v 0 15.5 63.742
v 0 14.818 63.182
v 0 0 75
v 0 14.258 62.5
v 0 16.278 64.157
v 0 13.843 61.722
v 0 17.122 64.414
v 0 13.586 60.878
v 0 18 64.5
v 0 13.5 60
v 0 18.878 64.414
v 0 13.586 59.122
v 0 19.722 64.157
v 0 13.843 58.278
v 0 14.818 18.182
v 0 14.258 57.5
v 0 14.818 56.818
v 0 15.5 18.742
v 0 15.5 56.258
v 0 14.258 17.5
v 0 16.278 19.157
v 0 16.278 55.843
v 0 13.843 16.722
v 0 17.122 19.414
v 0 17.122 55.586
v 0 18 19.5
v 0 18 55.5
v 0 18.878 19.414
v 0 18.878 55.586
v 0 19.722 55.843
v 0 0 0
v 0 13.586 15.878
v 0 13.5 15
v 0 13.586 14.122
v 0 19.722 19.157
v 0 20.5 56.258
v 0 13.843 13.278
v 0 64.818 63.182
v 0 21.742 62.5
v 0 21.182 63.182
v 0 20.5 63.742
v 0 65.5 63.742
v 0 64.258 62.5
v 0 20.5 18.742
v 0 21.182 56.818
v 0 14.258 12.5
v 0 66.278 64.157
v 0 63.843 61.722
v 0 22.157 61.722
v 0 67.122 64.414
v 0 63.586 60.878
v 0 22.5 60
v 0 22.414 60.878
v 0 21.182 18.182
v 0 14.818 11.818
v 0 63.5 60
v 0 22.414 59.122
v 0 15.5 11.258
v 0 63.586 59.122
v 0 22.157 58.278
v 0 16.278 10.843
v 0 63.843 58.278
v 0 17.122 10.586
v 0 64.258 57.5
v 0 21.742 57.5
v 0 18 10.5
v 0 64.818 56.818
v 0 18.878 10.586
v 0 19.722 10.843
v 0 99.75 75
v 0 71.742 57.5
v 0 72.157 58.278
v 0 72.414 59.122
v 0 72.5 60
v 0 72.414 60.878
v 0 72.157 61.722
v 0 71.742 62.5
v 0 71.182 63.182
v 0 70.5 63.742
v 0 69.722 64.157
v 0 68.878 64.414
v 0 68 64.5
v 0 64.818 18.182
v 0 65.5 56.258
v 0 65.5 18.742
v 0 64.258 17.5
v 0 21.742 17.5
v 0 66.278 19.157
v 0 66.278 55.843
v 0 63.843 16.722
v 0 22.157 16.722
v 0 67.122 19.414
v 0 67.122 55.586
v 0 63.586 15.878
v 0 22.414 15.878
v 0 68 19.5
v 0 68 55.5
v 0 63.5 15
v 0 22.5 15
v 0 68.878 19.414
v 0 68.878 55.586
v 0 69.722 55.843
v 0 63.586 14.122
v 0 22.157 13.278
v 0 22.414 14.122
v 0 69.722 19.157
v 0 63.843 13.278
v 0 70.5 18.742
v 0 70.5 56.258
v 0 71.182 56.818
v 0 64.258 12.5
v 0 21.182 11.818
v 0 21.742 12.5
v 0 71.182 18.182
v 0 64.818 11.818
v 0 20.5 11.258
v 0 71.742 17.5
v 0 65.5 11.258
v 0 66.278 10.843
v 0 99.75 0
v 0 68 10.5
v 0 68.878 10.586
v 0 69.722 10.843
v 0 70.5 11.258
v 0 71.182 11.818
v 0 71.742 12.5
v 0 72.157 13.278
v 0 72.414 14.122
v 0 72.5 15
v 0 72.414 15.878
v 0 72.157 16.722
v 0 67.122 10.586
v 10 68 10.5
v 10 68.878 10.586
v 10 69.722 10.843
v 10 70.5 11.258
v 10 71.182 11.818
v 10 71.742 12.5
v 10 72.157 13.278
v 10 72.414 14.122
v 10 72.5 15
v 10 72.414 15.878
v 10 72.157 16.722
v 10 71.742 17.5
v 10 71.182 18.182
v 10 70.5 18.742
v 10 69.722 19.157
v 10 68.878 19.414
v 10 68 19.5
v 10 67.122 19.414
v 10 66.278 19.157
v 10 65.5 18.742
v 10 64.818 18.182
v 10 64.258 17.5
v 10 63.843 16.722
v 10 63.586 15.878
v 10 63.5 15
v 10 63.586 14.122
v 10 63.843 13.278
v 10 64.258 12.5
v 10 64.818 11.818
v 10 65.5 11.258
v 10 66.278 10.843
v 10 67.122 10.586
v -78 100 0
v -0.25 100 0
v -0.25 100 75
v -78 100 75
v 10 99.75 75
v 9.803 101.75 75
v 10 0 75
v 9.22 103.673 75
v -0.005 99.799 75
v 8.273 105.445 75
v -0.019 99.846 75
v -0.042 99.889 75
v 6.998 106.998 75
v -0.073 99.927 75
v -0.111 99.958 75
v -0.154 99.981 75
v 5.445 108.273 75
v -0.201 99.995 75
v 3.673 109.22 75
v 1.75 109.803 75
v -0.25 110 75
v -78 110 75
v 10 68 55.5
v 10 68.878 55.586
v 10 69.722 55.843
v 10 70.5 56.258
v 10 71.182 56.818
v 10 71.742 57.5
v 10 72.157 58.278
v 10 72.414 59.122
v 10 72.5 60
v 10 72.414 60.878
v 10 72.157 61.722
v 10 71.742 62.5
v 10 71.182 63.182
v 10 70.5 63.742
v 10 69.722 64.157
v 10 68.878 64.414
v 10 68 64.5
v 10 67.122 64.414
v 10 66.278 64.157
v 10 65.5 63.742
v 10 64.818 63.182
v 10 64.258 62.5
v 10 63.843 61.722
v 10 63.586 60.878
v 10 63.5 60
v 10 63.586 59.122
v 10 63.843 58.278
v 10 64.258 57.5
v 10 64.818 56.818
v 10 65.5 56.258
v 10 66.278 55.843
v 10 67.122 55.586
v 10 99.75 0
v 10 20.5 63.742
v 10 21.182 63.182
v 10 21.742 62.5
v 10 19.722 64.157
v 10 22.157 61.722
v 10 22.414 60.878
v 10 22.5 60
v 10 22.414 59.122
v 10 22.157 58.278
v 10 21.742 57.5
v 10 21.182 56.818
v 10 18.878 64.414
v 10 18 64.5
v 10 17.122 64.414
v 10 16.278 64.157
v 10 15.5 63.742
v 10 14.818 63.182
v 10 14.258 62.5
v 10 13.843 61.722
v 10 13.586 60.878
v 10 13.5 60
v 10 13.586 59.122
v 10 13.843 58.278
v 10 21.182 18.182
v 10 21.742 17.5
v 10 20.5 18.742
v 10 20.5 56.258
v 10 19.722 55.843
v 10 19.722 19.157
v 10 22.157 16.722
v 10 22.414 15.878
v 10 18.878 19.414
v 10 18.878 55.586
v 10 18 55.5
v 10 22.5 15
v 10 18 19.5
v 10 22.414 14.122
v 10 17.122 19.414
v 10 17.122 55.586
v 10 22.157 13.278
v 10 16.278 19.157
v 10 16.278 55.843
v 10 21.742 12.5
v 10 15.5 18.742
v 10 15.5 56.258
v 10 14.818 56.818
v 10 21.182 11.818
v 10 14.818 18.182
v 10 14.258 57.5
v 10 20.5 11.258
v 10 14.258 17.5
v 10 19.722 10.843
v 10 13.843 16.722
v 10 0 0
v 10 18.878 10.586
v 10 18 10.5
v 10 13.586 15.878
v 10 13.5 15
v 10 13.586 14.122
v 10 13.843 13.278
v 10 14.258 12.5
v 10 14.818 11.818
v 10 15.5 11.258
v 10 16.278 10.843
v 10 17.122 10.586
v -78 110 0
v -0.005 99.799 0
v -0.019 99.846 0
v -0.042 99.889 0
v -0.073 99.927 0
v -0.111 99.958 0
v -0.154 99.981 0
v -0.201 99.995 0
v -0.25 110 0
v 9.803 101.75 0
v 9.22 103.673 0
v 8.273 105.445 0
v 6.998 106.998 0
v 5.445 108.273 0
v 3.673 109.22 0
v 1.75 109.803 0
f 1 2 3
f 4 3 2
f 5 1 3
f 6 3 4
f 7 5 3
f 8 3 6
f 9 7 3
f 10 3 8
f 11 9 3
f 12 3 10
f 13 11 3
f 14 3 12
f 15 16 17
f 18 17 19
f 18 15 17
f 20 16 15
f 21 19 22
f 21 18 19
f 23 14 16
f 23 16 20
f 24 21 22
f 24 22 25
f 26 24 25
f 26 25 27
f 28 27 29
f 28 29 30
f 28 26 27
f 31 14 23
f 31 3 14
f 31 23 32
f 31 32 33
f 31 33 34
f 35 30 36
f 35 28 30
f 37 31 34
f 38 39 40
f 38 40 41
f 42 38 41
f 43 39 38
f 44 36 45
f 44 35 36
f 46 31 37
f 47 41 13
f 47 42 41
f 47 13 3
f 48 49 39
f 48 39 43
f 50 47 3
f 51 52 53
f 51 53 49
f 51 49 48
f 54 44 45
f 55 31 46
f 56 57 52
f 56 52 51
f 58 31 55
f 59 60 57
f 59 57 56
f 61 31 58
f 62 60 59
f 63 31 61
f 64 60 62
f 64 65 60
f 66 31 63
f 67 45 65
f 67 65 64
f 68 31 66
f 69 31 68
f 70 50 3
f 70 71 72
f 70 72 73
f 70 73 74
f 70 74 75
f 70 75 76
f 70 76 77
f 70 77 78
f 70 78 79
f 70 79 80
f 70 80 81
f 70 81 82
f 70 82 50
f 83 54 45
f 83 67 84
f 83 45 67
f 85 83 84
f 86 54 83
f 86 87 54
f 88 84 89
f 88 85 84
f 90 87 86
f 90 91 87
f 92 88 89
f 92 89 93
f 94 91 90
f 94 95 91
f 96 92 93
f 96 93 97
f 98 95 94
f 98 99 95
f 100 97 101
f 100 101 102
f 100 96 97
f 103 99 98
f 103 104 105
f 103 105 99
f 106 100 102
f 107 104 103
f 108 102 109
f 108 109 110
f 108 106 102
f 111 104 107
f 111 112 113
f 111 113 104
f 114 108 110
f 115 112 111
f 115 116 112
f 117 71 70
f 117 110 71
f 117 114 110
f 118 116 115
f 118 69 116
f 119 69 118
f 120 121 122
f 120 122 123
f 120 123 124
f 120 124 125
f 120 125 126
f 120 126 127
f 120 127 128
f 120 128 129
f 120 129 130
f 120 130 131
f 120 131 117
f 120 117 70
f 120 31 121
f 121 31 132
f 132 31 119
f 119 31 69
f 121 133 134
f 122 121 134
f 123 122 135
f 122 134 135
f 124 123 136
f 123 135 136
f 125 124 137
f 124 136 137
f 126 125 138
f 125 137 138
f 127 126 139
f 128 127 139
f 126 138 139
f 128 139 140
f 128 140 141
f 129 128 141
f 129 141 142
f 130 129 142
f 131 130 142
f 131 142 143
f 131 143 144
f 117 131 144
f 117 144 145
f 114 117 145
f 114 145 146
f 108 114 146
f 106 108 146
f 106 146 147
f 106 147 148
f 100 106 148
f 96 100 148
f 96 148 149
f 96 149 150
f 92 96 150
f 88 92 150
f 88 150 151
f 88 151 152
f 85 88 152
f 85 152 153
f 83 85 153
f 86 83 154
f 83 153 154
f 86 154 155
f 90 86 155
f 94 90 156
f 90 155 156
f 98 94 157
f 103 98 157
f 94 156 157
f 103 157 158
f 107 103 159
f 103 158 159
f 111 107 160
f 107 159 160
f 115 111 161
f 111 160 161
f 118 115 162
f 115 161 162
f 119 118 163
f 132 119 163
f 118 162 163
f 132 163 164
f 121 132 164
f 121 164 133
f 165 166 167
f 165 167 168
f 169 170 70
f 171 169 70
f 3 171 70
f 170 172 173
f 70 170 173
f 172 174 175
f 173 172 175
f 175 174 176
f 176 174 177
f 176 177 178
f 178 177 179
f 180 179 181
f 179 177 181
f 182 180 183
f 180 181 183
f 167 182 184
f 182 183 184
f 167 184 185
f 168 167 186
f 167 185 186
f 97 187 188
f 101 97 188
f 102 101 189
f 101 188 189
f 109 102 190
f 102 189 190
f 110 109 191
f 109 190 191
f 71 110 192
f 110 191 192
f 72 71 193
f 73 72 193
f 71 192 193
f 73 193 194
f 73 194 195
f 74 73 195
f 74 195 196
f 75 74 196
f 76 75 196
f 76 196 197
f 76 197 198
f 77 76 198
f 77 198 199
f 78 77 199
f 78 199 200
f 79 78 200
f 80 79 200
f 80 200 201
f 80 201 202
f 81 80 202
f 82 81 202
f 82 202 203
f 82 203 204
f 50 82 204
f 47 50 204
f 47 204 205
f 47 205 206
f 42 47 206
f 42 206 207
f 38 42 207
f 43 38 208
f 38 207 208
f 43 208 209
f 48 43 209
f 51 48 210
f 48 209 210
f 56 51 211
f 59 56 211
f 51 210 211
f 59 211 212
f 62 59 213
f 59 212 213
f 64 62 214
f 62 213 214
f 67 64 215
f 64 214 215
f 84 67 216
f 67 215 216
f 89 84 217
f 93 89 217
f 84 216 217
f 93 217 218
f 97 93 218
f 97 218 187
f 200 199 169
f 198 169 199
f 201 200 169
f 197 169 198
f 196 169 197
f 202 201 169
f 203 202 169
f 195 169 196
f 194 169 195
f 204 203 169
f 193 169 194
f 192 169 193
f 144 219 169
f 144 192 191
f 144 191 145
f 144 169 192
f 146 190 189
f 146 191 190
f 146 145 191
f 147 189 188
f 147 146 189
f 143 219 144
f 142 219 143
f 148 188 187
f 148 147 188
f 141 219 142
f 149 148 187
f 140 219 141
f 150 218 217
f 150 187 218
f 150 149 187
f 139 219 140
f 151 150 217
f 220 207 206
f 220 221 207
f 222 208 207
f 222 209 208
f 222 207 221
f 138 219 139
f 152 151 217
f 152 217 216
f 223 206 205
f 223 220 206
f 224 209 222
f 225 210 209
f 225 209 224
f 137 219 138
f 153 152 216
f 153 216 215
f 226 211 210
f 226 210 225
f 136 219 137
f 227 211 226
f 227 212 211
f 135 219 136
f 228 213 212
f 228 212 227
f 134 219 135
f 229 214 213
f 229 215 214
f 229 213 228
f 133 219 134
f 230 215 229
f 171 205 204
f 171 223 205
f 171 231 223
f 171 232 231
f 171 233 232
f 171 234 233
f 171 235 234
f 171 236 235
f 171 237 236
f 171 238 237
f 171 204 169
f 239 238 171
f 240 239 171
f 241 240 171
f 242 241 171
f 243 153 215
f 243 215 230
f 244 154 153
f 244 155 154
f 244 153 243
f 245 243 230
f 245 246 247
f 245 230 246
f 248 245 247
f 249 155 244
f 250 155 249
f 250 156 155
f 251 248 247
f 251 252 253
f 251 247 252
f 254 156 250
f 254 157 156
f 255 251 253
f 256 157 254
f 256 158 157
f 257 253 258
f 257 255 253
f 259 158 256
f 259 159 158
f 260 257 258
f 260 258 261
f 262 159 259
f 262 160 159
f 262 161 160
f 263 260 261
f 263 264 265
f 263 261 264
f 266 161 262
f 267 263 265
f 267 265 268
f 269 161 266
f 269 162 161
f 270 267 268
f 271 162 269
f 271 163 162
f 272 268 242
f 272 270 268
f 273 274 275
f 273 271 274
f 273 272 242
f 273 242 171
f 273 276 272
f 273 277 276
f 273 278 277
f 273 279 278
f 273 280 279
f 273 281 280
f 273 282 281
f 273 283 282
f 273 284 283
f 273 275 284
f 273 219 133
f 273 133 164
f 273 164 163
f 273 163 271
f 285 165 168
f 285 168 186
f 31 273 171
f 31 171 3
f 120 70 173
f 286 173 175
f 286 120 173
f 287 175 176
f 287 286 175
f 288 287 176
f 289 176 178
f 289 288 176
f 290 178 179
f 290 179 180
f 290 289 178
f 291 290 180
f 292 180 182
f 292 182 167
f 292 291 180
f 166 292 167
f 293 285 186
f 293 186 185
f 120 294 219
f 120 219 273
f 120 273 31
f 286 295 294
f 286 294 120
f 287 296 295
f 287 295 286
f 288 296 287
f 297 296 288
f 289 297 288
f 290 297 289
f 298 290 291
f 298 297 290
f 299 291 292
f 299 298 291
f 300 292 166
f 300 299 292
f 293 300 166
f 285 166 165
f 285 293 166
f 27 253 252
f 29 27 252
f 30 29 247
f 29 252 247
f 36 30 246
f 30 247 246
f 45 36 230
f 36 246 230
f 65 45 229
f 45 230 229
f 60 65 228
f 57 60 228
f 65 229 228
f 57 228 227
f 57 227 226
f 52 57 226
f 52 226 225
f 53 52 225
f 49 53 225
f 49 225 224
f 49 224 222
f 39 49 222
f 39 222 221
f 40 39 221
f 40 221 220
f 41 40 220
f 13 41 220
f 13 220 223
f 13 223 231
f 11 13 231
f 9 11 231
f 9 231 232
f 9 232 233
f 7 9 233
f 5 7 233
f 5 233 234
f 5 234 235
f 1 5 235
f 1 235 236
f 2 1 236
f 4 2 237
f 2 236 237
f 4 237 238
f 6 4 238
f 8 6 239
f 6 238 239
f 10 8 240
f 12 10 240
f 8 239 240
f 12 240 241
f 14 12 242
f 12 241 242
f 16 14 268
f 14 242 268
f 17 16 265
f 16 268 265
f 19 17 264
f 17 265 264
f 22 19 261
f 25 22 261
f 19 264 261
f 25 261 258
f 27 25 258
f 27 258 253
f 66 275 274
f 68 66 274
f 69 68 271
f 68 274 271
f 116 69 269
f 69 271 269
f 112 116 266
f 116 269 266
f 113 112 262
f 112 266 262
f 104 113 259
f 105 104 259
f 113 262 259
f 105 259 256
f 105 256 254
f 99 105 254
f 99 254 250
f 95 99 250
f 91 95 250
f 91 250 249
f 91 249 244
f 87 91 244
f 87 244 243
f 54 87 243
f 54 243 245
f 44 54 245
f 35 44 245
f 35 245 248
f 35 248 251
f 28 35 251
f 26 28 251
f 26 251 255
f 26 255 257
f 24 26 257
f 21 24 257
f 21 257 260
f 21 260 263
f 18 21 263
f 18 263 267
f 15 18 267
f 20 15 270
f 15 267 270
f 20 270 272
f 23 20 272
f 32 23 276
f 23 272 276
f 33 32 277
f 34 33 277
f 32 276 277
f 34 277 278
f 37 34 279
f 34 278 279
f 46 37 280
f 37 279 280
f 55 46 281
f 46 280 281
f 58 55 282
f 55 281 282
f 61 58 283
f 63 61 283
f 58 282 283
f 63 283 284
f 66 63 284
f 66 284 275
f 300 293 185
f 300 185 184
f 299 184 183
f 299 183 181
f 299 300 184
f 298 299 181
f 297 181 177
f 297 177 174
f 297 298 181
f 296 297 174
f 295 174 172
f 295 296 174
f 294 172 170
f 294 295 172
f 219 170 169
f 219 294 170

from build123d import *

# Parameters (mm, degrees)
BASE_FLANGE1_DEPTH = 75
SKETCH6_R          = 4.5
CUT_EXTRUDE1_DEPTH = 160.590099944


# Sheet-metal steps are written as plain solids
with BuildPart() as part:
    # Sketch1 → Base-Flange1 (new body)
    with BuildSketch(Plane.XY):
        with BuildLine():
            Line((0, 0), (0, 99.75))
            ThreePointArc((0, 99.75), (-0.073223305, 99.926776695), (-0.25, 100))
            Line((-0.25, 100), (-78, 100))
            Line((-78, 100), (-78, 110))
            Line((-78, 110), (-0.25, 110))
            ThreePointArc((-0.25, 110), (6.997844507, 106.997844507), (10, 99.75))
            Line((10, 99.75), (10, 0))
            Line((10, 0), (0, 0))
        make_face()
    extrude(amount=BASE_FLANGE1_DEPTH)

    # Sketch6 → Cut-Extrude1 (cut, through all)
    with BuildSketch(Plane(origin=(10, 0, 0), x_dir=(0, 0, -1), z_dir=(1, 0, 0))):
        with Locations((-60, 18)):
            Circle(SKETCH6_R)
        with Locations((-15, 18)):
            Circle(SKETCH6_R)
        with Locations((-60, 68)):
            Circle(SKETCH6_R)
        with Locations((-15, 68)):
            Circle(SKETCH6_R)
    extrude(amount=-CUT_EXTRUDE1_DEPTH, mode=Mode.SUBTRACT)


solid = part.part
